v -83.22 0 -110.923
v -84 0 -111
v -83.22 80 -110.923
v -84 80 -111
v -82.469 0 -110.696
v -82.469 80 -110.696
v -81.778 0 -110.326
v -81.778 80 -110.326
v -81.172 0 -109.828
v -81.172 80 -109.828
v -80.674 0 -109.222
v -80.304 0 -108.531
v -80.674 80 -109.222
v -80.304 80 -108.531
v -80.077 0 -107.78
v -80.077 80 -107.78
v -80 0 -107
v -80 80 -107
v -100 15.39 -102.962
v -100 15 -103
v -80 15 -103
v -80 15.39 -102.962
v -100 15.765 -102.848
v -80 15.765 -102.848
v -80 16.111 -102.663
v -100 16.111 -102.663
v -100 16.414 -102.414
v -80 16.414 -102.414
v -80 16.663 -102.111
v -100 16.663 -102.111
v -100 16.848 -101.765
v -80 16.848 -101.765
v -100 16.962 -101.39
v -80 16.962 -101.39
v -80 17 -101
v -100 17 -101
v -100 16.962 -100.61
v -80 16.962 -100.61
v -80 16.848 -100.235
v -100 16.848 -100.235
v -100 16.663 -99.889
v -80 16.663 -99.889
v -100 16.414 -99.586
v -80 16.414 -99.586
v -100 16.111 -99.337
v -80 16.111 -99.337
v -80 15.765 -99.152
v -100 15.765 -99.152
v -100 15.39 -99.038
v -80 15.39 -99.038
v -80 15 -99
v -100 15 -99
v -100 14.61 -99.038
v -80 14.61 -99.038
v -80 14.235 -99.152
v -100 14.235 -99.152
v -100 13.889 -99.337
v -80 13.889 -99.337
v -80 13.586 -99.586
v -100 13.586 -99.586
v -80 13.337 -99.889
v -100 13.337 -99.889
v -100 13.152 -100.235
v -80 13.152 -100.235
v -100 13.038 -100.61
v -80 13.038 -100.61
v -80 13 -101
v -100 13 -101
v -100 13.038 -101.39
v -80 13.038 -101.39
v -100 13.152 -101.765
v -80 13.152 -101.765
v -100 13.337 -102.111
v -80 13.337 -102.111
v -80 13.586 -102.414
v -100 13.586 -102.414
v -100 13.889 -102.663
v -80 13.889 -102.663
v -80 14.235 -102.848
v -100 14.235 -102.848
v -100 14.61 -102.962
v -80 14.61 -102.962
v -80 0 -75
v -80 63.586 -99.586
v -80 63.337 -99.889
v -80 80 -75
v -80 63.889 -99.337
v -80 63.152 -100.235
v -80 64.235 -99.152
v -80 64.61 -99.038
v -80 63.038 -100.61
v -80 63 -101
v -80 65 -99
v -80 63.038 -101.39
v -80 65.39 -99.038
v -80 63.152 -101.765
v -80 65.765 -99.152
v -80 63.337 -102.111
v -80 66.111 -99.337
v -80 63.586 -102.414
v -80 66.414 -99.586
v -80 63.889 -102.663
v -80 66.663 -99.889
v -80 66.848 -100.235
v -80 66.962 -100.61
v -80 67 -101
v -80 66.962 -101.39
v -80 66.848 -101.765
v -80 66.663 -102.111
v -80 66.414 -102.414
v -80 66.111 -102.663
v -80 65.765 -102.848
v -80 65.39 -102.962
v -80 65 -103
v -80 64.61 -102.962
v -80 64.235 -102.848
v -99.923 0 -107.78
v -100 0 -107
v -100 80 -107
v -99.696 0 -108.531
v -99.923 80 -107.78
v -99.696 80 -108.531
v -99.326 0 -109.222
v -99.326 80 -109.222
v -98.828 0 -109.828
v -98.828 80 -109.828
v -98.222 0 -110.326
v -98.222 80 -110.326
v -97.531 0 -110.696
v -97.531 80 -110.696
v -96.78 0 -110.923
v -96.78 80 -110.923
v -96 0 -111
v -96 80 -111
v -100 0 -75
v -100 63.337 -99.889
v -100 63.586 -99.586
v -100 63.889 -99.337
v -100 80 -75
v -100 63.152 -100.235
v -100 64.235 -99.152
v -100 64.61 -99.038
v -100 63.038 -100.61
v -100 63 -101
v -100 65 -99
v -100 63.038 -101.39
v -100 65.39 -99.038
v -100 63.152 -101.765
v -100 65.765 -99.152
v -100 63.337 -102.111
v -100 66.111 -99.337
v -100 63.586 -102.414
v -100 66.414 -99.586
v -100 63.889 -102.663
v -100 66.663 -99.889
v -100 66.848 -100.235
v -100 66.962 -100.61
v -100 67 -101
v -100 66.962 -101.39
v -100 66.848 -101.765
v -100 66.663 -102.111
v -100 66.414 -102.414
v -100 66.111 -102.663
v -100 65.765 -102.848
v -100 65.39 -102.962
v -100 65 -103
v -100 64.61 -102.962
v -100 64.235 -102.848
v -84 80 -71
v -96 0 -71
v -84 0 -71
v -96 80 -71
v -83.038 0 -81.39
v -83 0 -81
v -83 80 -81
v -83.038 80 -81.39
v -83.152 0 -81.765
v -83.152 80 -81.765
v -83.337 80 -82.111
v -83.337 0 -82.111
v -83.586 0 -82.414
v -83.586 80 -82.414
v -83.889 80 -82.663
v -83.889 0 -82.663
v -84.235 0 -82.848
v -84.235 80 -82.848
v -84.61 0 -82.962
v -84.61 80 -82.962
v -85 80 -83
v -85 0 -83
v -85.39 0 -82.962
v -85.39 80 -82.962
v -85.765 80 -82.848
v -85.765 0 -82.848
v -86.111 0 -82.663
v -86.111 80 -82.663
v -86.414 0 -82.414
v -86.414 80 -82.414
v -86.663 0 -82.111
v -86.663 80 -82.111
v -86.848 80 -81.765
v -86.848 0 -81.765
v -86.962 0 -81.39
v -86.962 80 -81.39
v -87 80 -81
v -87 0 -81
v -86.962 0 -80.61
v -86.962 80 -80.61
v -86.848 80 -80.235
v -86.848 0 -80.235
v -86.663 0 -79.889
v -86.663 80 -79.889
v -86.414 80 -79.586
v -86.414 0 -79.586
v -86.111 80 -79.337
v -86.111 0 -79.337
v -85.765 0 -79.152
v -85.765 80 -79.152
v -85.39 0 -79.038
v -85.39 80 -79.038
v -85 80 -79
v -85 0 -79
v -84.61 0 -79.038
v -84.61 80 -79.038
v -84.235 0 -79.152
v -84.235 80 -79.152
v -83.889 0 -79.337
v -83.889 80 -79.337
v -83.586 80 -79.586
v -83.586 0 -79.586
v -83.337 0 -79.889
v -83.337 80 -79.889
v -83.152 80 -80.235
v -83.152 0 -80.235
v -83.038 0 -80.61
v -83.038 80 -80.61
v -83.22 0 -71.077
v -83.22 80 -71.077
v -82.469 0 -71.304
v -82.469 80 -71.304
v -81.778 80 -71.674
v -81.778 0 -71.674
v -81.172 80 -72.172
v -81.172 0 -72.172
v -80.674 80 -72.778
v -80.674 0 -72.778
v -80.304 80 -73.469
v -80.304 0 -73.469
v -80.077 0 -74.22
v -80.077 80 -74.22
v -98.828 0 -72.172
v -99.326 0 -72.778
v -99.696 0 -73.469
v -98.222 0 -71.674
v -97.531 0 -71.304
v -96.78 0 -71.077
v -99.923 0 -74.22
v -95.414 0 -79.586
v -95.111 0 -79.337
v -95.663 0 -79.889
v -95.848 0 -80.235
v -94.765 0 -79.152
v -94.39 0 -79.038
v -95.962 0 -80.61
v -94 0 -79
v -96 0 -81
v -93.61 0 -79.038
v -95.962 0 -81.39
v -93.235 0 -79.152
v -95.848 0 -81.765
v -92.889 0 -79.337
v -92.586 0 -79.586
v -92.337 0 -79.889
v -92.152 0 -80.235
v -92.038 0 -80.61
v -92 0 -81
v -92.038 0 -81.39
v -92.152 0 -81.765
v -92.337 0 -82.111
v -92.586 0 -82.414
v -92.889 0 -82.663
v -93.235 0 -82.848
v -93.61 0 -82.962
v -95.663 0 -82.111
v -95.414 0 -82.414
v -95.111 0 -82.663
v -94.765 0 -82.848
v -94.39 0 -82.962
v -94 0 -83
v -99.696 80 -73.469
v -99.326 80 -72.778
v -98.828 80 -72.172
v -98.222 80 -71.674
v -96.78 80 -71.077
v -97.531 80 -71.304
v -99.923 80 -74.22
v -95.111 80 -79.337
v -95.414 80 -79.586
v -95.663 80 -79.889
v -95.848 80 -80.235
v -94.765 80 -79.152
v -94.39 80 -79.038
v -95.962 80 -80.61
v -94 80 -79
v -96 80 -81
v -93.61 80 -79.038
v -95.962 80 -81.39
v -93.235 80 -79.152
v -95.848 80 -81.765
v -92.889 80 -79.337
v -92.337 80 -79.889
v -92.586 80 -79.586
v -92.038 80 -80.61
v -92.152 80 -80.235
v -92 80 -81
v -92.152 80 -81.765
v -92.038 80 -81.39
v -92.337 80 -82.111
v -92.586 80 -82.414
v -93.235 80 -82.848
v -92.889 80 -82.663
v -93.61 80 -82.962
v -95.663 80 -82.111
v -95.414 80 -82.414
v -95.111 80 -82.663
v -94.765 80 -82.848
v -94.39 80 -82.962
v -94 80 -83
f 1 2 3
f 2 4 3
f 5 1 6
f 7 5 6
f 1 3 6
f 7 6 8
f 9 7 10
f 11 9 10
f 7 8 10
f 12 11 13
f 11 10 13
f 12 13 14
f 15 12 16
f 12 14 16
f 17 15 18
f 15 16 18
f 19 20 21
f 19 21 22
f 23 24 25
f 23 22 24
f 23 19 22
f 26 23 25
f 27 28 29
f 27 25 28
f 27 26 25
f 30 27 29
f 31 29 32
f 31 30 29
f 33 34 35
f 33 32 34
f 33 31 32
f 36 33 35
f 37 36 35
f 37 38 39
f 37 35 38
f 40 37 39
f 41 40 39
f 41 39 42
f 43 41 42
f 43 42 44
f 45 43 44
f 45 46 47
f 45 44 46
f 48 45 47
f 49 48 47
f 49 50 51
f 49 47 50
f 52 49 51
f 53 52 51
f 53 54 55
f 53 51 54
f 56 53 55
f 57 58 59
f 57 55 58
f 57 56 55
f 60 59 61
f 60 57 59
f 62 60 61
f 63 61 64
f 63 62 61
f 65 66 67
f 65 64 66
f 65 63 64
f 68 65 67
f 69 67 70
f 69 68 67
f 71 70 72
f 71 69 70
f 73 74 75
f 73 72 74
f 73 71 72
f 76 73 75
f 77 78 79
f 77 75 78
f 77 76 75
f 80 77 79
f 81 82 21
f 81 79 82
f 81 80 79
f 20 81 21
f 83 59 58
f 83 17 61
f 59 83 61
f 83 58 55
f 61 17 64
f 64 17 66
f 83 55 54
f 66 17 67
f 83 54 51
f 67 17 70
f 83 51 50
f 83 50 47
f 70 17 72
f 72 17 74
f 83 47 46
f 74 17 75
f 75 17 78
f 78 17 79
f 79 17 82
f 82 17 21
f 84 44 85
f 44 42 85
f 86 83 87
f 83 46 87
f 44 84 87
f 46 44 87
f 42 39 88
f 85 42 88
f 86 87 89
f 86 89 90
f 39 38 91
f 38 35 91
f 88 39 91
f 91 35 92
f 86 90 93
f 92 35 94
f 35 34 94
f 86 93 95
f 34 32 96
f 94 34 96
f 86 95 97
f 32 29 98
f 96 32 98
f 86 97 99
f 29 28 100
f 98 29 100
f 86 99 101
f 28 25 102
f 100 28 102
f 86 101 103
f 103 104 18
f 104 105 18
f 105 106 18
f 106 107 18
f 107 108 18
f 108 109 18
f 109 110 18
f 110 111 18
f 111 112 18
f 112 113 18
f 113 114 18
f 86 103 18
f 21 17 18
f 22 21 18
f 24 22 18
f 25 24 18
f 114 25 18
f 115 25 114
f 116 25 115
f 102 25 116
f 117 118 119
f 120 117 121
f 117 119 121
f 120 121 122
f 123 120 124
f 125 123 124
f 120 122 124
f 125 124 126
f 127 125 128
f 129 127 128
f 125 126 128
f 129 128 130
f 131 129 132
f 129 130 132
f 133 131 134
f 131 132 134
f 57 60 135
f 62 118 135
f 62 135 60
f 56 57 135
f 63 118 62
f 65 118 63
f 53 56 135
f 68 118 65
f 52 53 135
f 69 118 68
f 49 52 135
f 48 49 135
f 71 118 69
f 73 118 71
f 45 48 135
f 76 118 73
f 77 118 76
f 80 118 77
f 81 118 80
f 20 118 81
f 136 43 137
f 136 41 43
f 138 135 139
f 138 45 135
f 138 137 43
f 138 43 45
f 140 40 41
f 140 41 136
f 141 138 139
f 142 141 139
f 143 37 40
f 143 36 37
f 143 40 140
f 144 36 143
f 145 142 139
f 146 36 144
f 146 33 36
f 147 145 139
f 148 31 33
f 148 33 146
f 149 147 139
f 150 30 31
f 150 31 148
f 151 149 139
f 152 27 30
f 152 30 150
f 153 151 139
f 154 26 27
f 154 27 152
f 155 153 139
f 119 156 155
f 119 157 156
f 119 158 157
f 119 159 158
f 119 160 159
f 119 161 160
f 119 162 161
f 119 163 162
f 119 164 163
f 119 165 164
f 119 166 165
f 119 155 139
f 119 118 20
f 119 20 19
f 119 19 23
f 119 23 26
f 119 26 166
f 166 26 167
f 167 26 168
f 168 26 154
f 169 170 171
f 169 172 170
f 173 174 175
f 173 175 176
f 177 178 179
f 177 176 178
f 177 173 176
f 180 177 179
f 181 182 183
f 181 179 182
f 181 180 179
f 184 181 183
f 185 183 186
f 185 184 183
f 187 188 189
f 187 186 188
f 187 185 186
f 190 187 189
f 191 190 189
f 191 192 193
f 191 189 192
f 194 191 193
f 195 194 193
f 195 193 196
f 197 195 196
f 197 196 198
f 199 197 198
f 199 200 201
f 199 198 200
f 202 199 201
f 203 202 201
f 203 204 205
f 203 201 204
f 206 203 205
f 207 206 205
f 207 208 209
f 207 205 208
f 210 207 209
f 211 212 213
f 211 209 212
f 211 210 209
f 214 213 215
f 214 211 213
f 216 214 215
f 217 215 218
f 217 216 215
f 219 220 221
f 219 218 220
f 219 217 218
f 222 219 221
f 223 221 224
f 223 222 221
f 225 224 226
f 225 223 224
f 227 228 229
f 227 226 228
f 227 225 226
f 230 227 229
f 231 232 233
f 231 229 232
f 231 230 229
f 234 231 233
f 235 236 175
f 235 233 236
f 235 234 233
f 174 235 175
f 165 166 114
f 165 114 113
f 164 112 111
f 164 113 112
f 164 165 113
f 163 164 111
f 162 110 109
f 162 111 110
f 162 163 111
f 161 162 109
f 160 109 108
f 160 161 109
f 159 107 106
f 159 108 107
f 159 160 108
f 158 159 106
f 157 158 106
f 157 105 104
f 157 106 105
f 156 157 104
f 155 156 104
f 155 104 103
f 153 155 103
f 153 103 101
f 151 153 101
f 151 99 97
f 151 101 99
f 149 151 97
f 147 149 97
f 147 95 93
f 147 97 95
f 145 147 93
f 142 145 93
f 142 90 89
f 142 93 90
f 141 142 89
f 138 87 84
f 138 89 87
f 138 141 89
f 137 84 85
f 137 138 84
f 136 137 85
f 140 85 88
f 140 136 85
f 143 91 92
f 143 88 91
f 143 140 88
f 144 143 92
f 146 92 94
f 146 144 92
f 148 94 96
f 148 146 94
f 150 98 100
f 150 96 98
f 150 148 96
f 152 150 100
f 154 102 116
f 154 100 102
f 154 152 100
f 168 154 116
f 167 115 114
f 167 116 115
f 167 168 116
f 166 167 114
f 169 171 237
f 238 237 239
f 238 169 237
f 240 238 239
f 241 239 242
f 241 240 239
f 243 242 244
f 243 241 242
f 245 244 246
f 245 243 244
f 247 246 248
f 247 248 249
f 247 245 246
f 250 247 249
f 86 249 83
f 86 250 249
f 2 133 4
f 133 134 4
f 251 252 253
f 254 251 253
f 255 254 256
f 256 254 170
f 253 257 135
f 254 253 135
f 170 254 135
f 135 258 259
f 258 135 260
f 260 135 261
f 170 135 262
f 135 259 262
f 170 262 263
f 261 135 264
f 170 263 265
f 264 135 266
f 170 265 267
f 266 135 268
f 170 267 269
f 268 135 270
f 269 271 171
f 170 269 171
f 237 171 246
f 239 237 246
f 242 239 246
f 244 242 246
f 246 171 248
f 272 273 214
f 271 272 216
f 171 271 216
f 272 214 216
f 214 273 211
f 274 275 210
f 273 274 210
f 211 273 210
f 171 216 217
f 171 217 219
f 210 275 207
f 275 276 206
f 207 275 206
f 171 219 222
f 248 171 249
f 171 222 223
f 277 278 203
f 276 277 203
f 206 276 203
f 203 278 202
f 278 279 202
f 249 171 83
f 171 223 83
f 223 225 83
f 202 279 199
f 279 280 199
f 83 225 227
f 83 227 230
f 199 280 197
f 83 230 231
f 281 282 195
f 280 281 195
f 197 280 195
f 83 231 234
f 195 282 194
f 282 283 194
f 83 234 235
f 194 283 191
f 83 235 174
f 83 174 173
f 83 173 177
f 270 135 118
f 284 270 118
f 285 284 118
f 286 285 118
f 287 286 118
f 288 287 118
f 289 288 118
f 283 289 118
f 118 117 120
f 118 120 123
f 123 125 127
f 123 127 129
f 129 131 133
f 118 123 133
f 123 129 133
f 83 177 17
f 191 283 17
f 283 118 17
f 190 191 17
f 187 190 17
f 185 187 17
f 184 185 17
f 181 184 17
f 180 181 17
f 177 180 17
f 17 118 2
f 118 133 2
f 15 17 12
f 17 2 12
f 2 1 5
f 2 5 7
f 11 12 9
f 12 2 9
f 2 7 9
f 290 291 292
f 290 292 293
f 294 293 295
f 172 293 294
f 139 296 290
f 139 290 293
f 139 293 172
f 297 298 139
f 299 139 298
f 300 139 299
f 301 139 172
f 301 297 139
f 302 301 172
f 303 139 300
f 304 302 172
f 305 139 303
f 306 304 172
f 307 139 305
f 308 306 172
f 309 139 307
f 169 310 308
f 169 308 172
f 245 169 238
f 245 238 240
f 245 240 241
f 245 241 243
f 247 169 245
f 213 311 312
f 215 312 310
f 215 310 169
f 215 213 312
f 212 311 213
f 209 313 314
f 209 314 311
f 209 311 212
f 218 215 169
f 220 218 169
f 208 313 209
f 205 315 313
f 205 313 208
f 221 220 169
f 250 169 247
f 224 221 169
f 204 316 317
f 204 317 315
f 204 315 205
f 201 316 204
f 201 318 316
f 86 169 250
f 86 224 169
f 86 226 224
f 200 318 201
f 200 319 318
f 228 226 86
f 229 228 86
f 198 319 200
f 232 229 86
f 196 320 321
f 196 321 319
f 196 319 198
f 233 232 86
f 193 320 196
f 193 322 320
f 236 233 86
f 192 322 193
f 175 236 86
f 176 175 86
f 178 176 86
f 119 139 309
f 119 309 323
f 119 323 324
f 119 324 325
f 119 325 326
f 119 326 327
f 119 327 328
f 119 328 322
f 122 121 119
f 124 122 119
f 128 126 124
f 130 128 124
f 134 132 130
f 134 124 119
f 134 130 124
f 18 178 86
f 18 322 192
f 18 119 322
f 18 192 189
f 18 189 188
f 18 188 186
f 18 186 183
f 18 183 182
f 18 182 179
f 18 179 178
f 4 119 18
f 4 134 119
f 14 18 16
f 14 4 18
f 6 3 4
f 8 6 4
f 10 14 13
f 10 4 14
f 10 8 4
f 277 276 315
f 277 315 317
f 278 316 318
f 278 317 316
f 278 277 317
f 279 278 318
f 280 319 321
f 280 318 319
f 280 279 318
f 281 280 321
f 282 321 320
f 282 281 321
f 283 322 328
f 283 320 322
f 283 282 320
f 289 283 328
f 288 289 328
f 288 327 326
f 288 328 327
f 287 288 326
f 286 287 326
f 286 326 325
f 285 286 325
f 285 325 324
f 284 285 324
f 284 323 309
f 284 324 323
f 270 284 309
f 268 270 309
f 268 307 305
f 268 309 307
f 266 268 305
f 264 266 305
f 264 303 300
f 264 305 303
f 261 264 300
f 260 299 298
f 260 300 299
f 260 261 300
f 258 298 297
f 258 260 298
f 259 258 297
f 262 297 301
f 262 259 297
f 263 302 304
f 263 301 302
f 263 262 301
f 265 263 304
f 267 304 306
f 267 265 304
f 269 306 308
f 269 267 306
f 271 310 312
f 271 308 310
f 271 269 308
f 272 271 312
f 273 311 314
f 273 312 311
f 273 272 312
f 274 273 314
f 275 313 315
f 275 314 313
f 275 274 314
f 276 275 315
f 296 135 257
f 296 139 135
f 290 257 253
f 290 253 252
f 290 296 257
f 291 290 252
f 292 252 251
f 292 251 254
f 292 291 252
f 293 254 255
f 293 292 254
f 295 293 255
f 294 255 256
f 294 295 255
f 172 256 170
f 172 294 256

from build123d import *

# Parameters (mm, degrees)
CYLINDER054_R       = 2
CYLINDER054_DEPTH   = 100
ARRAY001031_Y_COUNT = 2
ARRAY001031_Y_PITCH = 50
CYLINDER052_R       = 2
CYLINDER052_DEPTH   = 100
ARRAY001030_X_COUNT = 2
ARRAY001030_X_PITCH = 9
BOX029_W            = 20
BOX029_H            = 80
BOX029_DEPTH        = 40
FILLET001_R         = 4


with BuildPart() as horizontal_hole_array005:
    # Cylinder054 → Cylinder054 (new body)
    with BuildSketch(Plane(origin=(-50, 15, -10), x_dir=(0, 0, -1), z_dir=(1, 0, 0))):
        Circle(CYLINDER054_R)
    extrude(amount=CYLINDER054_DEPTH)

    # Array001031 Y: horizontal hole array005 ×2


with BuildPart() as horizontal_hole_array005_1:
    add(horizontal_hole_array005.part)
    with Locations(*[(0, i * ARRAY001031_Y_PITCH, 0) for i in range(1, ARRAY001031_Y_COUNT)]):
        add(horizontal_hole_array005.part)


with BuildPart() as stand_attachment_hole_fusion002:
    # Cylinder052 → Cylinder052 (new body)
    with BuildSketch(Plane(origin=(0, -10, 10), x_dir=(1, 0, 0), z_dir=(0, 1, 0))):
        Circle(CYLINDER052_R)
    extrude(amount=CYLINDER052_DEPTH)

    # Array001030 X: stand attachment hole fusion002 ×2


with BuildPart() as stand_attachment_hole_fusion002_1:
    add(stand_attachment_hole_fusion002.part)
    with Locations(*[(i * ARRAY001030_X_PITCH, 0, 0) for i in range(1, ARRAY001030_X_COUNT)]):
        add(stand_attachment_hole_fusion002.part)

    # Fusion025: union horizontal hole array005
    add(horizontal_hole_array005_1.part)


with BuildPart() as stand_attachment_middle_fillet001:
    # Box029 → Box029 (new body)
    with BuildSketch(Plane(origin=(-6, 0, -20), x_dir=(1, 0, 0), z_dir=(0, 0, 1))):
        with Locations((10, 40)):
            Rectangle(BOX029_W, BOX029_H)
    extrude(amount=BOX029_DEPTH)

    # Cut019004: cut stand attachment hole fusion002
    add(stand_attachment_hole_fusion002_1.part, mode=Mode.SUBTRACT)


with BuildPart() as stand_attachment_middle_fillet001_1:
    # Cut019004 placement: moved
    add(stand_attachment_middle_fillet001.part.moved(Location((-94, 0, -91))))

    # Fillet001
    fillet001_edges = [stand_attachment_middle_fillet001_1.edges().sort_by_distance(p)[0] for p in [
        (-100, 40, -71),
        (-100, 40, -111),
        (-80, 40, -71),
        (-80, 40, -111),
    ]]
    fillet(fillet001_edges, radius=FILLET001_R)


solid = stand_attachment_middle_fillet001_1.part
